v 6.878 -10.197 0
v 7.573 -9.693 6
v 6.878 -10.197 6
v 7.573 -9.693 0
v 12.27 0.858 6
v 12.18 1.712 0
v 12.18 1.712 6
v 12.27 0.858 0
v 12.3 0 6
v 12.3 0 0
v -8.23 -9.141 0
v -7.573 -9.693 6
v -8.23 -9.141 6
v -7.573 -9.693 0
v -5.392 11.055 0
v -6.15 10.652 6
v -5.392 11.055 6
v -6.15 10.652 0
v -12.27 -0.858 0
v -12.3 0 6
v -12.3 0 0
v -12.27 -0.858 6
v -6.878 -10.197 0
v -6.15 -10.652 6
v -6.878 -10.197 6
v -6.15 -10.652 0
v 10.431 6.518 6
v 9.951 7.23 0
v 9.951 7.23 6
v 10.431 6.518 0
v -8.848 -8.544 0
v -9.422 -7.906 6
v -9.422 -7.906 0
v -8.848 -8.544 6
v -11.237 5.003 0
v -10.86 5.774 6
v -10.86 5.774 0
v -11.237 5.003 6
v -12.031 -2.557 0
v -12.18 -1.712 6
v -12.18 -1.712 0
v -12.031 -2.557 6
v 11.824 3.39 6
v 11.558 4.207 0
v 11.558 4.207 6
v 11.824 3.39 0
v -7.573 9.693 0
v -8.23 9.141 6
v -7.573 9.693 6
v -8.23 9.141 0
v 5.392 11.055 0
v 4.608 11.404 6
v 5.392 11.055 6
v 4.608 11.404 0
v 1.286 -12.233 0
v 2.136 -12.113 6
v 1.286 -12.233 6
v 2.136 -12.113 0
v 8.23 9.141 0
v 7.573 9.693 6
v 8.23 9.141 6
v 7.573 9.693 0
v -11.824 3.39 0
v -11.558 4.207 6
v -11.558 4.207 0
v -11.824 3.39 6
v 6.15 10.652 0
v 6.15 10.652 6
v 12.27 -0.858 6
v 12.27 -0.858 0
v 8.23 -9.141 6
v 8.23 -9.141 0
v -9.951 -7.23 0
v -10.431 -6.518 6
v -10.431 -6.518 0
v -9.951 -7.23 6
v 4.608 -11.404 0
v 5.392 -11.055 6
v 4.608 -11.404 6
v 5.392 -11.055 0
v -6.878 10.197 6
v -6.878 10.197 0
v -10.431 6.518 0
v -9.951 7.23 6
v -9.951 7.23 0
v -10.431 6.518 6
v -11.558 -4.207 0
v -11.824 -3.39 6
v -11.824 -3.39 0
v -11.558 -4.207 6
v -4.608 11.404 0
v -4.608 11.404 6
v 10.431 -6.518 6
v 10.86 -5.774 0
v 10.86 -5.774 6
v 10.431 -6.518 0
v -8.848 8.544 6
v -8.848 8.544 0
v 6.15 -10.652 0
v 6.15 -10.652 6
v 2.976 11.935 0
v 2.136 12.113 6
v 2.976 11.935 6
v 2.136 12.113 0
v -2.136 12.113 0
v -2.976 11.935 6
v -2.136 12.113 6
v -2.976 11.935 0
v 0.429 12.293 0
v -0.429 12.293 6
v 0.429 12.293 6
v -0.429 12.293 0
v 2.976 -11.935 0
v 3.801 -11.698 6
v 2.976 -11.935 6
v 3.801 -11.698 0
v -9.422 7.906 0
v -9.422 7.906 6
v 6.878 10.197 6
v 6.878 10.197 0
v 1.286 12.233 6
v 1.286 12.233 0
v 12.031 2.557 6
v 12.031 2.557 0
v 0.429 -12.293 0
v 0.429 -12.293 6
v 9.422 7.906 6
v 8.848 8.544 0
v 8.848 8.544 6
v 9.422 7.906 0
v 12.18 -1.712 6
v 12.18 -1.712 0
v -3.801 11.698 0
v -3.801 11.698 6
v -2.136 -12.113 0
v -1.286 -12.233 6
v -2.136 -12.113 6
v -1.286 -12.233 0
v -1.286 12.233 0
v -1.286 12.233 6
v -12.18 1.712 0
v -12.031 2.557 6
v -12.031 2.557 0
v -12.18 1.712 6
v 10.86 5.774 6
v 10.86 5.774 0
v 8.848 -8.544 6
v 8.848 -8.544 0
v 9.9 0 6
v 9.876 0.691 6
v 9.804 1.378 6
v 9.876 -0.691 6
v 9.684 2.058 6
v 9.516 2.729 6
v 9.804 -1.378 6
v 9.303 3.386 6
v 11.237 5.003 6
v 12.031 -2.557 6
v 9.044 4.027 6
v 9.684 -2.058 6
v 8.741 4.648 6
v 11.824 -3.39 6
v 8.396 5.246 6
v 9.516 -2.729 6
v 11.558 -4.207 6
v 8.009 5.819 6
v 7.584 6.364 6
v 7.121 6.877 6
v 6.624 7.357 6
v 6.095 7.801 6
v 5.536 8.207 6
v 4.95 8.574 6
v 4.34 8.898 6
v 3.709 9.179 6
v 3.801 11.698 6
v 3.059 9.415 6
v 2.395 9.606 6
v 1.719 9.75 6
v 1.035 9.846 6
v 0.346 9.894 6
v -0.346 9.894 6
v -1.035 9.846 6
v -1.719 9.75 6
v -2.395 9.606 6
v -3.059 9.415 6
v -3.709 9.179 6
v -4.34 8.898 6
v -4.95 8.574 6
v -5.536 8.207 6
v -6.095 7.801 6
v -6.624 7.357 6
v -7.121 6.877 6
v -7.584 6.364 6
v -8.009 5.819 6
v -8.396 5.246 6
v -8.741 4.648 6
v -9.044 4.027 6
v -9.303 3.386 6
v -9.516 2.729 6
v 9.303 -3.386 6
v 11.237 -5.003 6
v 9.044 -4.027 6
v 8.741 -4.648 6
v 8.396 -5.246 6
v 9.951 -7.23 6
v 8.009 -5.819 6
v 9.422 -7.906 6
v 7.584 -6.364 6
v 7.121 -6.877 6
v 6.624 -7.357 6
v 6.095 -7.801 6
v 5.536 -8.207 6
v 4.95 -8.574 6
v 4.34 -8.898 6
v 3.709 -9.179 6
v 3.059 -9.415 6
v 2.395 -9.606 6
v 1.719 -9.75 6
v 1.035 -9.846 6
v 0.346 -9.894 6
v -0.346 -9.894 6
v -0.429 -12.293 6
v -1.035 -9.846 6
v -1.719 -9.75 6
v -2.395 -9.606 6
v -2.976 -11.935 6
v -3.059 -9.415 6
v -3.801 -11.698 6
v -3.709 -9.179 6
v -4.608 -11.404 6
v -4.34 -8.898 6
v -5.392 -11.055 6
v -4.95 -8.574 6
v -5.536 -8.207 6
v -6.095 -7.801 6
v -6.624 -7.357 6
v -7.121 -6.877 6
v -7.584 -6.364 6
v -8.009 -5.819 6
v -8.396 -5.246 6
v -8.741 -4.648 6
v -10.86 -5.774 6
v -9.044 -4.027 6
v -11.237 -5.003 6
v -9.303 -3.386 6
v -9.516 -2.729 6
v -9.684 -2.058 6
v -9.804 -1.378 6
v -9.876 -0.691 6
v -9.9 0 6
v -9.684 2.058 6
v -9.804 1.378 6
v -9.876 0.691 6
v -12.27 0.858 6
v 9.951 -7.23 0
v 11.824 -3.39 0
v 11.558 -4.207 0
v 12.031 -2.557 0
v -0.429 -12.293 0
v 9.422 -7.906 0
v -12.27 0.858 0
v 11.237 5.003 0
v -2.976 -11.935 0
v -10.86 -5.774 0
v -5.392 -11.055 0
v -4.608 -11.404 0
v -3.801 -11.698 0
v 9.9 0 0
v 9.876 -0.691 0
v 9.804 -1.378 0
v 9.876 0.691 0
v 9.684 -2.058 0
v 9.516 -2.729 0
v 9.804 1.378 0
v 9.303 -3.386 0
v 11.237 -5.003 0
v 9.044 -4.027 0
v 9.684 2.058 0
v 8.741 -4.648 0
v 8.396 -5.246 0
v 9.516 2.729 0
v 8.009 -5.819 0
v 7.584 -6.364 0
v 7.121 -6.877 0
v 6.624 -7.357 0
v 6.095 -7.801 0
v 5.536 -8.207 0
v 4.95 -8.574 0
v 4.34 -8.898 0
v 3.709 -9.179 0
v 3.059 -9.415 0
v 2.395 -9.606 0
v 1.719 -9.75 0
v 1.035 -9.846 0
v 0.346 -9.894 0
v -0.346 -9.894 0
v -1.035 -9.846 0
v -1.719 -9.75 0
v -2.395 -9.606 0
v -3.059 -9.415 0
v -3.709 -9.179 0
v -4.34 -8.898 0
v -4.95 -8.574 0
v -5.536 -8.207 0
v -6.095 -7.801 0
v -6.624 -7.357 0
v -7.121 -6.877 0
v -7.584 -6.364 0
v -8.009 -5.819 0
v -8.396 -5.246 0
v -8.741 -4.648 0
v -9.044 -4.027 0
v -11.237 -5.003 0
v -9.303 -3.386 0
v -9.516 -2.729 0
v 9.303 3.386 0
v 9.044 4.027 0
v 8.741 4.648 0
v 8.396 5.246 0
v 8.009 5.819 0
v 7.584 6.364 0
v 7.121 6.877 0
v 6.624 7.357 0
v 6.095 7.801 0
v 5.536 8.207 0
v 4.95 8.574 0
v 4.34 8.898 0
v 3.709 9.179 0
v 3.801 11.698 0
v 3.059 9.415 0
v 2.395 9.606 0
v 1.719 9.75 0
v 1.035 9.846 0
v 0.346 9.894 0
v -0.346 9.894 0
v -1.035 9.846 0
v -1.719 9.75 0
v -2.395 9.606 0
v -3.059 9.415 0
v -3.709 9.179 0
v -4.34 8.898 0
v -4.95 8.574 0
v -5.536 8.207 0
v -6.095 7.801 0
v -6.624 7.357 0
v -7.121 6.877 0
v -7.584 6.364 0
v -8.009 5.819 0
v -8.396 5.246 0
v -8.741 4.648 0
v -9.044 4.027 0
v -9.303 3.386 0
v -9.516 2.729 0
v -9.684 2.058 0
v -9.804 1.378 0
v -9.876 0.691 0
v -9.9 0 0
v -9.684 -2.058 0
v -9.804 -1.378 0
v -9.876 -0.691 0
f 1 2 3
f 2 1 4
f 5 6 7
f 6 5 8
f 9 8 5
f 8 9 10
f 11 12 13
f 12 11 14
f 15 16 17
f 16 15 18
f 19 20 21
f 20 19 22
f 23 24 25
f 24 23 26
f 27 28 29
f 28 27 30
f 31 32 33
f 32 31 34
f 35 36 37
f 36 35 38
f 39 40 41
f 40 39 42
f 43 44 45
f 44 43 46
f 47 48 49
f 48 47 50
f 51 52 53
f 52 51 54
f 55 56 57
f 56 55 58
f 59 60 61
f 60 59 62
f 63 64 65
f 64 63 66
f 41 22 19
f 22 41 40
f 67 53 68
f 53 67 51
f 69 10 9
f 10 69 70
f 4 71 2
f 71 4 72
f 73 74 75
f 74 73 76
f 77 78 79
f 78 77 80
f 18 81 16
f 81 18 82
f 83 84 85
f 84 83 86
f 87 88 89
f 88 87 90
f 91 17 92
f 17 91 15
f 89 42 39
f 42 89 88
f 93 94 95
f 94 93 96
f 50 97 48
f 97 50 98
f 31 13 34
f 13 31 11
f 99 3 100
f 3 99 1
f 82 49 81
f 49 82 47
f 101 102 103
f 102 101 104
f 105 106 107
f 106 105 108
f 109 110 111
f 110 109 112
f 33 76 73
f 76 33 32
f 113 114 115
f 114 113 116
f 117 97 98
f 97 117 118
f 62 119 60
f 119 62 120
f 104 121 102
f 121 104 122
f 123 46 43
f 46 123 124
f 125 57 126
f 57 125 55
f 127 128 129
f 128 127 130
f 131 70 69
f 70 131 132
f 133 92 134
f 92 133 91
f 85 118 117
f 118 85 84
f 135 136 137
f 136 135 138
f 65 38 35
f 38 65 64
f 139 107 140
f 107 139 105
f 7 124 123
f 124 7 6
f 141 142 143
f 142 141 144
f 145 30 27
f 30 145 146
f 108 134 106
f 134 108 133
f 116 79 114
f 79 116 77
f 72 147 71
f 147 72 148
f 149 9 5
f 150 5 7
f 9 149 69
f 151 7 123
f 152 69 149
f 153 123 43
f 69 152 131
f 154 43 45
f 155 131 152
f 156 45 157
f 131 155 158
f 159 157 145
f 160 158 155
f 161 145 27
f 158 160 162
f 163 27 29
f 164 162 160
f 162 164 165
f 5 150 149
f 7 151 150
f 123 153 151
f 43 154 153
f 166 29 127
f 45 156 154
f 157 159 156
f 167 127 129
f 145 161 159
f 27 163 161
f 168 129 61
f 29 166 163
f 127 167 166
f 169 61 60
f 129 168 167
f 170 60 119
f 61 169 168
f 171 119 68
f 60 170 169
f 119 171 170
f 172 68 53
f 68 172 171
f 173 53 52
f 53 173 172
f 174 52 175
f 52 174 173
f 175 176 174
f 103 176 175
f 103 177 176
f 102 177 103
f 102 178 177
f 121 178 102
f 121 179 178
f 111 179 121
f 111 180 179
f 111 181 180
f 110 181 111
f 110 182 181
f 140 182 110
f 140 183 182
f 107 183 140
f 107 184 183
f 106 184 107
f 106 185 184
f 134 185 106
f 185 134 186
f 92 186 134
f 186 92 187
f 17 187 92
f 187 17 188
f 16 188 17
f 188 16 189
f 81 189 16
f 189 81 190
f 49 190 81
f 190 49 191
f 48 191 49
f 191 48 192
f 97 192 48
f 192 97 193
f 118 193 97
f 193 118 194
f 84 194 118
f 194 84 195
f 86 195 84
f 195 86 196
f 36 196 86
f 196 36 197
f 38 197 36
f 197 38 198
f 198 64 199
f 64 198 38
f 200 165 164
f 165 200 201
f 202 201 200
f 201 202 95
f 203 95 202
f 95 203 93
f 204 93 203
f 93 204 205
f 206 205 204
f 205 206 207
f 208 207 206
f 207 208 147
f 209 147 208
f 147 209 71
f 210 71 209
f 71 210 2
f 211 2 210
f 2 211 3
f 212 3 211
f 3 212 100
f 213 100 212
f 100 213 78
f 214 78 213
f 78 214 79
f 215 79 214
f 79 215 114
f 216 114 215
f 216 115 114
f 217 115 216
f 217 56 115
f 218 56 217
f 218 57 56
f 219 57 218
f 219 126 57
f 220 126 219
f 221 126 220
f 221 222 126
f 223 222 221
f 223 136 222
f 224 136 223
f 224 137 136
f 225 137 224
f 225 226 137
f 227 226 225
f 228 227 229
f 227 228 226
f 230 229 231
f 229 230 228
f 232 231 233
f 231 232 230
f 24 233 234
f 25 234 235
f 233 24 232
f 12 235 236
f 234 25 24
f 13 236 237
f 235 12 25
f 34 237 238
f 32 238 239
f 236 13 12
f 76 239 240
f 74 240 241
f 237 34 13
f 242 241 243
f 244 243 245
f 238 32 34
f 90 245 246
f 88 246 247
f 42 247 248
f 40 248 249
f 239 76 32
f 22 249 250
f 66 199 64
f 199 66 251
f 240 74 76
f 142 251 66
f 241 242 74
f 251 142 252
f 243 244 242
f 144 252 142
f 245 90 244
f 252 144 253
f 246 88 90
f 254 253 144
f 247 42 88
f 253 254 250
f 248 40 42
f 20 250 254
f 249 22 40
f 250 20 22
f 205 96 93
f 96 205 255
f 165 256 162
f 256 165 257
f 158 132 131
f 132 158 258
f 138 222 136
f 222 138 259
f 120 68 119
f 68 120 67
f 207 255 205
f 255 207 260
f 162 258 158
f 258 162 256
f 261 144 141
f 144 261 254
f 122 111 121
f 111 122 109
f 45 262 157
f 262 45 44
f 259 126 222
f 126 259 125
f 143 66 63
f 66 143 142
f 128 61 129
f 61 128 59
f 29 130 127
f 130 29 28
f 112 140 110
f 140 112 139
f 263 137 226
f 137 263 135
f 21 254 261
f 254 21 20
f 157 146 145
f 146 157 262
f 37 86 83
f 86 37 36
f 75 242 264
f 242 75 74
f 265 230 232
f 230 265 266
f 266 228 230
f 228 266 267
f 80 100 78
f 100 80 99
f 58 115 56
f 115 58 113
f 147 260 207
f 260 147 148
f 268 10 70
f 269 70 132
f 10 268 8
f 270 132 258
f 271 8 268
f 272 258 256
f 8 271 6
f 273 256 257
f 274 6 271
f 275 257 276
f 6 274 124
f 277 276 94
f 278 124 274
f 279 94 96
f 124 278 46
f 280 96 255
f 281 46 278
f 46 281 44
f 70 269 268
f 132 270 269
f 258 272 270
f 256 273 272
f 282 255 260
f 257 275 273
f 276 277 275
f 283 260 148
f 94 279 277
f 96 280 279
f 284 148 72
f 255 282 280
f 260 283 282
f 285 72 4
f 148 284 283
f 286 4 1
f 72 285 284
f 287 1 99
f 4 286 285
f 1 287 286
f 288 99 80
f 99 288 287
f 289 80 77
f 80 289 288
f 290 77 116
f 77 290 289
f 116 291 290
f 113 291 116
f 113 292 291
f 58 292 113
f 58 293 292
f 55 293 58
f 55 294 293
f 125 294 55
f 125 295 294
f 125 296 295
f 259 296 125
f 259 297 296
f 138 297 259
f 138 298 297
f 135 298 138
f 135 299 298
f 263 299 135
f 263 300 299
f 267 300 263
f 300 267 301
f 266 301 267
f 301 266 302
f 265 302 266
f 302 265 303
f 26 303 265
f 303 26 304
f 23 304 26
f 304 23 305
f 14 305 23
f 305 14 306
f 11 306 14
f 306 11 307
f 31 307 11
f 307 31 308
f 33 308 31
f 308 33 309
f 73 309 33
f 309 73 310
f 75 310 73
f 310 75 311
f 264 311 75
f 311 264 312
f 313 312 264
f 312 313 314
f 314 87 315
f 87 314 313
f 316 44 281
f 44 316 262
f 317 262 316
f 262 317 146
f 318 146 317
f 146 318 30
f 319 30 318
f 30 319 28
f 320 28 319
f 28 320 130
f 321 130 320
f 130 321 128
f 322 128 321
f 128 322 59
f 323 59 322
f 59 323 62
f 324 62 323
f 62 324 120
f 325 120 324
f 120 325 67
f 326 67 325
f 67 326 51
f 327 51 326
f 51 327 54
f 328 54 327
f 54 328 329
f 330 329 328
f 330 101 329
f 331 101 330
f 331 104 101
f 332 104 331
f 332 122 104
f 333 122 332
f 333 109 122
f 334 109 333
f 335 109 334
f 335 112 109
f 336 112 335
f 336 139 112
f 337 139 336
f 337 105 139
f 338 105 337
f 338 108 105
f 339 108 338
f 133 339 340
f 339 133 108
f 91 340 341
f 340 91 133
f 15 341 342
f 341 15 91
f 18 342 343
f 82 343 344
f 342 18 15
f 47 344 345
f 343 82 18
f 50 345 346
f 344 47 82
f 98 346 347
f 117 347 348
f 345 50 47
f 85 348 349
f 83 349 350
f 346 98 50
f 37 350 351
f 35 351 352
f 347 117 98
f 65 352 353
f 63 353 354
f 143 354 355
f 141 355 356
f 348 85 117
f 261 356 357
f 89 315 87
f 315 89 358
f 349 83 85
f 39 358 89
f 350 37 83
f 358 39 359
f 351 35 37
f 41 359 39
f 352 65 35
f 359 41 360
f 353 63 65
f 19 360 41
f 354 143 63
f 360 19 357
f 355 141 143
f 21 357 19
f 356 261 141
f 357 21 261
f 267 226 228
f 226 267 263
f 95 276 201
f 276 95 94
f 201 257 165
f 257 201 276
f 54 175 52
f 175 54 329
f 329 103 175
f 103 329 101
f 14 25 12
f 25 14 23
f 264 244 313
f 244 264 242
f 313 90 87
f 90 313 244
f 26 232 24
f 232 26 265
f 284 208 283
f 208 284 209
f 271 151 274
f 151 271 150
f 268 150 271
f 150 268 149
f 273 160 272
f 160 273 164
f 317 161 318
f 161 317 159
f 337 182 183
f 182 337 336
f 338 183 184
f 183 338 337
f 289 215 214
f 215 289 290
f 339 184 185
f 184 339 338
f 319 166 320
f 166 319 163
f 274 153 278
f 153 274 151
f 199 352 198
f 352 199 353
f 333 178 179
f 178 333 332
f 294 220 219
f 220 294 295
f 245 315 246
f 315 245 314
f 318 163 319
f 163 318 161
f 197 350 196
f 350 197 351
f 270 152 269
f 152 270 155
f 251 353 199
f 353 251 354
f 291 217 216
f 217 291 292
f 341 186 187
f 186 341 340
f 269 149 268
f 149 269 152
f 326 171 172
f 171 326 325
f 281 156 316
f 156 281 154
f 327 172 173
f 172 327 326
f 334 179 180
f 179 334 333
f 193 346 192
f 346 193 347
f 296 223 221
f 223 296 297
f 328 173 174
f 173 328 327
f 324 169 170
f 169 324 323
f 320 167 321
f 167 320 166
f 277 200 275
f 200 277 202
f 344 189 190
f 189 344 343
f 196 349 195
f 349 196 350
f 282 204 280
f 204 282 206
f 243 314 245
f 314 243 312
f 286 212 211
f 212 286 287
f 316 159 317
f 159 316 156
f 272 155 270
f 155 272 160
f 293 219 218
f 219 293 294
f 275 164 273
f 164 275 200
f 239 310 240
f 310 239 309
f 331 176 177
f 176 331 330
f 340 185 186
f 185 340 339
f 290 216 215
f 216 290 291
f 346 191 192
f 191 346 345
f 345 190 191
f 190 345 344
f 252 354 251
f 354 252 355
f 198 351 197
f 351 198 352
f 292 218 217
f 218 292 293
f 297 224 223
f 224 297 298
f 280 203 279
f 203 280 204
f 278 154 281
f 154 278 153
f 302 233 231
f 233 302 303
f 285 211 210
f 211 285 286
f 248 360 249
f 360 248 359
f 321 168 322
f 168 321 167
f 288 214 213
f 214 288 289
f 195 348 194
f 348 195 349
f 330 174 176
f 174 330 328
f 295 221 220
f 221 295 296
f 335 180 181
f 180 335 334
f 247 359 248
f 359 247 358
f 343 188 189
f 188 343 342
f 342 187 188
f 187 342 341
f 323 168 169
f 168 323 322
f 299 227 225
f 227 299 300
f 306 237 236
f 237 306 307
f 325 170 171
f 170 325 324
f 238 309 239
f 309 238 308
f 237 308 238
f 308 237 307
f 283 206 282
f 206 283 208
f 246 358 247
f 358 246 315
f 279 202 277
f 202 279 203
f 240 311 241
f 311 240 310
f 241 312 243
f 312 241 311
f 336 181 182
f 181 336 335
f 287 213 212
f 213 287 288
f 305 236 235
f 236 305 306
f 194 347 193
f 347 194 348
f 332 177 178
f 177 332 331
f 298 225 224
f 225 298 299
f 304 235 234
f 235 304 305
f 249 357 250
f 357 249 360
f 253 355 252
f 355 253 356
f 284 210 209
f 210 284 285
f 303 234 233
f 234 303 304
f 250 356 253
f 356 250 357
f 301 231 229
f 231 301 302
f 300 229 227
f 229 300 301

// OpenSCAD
$fa=4; // default minimum facet angle is now 4
$fs=0.05; // default minimum facet size is now 0.05 mm

innerRad = 7.2;
wallThickness = 2.4;
tolerance = .3;
height = 6;

difference() {
  cylinder(r = innerRad + 2*wallThickness + tolerance, h = height);
  translate([0, 0, -.1]) cylinder(r = innerRad + wallThickness + tolerance, h = height + .2);
}
